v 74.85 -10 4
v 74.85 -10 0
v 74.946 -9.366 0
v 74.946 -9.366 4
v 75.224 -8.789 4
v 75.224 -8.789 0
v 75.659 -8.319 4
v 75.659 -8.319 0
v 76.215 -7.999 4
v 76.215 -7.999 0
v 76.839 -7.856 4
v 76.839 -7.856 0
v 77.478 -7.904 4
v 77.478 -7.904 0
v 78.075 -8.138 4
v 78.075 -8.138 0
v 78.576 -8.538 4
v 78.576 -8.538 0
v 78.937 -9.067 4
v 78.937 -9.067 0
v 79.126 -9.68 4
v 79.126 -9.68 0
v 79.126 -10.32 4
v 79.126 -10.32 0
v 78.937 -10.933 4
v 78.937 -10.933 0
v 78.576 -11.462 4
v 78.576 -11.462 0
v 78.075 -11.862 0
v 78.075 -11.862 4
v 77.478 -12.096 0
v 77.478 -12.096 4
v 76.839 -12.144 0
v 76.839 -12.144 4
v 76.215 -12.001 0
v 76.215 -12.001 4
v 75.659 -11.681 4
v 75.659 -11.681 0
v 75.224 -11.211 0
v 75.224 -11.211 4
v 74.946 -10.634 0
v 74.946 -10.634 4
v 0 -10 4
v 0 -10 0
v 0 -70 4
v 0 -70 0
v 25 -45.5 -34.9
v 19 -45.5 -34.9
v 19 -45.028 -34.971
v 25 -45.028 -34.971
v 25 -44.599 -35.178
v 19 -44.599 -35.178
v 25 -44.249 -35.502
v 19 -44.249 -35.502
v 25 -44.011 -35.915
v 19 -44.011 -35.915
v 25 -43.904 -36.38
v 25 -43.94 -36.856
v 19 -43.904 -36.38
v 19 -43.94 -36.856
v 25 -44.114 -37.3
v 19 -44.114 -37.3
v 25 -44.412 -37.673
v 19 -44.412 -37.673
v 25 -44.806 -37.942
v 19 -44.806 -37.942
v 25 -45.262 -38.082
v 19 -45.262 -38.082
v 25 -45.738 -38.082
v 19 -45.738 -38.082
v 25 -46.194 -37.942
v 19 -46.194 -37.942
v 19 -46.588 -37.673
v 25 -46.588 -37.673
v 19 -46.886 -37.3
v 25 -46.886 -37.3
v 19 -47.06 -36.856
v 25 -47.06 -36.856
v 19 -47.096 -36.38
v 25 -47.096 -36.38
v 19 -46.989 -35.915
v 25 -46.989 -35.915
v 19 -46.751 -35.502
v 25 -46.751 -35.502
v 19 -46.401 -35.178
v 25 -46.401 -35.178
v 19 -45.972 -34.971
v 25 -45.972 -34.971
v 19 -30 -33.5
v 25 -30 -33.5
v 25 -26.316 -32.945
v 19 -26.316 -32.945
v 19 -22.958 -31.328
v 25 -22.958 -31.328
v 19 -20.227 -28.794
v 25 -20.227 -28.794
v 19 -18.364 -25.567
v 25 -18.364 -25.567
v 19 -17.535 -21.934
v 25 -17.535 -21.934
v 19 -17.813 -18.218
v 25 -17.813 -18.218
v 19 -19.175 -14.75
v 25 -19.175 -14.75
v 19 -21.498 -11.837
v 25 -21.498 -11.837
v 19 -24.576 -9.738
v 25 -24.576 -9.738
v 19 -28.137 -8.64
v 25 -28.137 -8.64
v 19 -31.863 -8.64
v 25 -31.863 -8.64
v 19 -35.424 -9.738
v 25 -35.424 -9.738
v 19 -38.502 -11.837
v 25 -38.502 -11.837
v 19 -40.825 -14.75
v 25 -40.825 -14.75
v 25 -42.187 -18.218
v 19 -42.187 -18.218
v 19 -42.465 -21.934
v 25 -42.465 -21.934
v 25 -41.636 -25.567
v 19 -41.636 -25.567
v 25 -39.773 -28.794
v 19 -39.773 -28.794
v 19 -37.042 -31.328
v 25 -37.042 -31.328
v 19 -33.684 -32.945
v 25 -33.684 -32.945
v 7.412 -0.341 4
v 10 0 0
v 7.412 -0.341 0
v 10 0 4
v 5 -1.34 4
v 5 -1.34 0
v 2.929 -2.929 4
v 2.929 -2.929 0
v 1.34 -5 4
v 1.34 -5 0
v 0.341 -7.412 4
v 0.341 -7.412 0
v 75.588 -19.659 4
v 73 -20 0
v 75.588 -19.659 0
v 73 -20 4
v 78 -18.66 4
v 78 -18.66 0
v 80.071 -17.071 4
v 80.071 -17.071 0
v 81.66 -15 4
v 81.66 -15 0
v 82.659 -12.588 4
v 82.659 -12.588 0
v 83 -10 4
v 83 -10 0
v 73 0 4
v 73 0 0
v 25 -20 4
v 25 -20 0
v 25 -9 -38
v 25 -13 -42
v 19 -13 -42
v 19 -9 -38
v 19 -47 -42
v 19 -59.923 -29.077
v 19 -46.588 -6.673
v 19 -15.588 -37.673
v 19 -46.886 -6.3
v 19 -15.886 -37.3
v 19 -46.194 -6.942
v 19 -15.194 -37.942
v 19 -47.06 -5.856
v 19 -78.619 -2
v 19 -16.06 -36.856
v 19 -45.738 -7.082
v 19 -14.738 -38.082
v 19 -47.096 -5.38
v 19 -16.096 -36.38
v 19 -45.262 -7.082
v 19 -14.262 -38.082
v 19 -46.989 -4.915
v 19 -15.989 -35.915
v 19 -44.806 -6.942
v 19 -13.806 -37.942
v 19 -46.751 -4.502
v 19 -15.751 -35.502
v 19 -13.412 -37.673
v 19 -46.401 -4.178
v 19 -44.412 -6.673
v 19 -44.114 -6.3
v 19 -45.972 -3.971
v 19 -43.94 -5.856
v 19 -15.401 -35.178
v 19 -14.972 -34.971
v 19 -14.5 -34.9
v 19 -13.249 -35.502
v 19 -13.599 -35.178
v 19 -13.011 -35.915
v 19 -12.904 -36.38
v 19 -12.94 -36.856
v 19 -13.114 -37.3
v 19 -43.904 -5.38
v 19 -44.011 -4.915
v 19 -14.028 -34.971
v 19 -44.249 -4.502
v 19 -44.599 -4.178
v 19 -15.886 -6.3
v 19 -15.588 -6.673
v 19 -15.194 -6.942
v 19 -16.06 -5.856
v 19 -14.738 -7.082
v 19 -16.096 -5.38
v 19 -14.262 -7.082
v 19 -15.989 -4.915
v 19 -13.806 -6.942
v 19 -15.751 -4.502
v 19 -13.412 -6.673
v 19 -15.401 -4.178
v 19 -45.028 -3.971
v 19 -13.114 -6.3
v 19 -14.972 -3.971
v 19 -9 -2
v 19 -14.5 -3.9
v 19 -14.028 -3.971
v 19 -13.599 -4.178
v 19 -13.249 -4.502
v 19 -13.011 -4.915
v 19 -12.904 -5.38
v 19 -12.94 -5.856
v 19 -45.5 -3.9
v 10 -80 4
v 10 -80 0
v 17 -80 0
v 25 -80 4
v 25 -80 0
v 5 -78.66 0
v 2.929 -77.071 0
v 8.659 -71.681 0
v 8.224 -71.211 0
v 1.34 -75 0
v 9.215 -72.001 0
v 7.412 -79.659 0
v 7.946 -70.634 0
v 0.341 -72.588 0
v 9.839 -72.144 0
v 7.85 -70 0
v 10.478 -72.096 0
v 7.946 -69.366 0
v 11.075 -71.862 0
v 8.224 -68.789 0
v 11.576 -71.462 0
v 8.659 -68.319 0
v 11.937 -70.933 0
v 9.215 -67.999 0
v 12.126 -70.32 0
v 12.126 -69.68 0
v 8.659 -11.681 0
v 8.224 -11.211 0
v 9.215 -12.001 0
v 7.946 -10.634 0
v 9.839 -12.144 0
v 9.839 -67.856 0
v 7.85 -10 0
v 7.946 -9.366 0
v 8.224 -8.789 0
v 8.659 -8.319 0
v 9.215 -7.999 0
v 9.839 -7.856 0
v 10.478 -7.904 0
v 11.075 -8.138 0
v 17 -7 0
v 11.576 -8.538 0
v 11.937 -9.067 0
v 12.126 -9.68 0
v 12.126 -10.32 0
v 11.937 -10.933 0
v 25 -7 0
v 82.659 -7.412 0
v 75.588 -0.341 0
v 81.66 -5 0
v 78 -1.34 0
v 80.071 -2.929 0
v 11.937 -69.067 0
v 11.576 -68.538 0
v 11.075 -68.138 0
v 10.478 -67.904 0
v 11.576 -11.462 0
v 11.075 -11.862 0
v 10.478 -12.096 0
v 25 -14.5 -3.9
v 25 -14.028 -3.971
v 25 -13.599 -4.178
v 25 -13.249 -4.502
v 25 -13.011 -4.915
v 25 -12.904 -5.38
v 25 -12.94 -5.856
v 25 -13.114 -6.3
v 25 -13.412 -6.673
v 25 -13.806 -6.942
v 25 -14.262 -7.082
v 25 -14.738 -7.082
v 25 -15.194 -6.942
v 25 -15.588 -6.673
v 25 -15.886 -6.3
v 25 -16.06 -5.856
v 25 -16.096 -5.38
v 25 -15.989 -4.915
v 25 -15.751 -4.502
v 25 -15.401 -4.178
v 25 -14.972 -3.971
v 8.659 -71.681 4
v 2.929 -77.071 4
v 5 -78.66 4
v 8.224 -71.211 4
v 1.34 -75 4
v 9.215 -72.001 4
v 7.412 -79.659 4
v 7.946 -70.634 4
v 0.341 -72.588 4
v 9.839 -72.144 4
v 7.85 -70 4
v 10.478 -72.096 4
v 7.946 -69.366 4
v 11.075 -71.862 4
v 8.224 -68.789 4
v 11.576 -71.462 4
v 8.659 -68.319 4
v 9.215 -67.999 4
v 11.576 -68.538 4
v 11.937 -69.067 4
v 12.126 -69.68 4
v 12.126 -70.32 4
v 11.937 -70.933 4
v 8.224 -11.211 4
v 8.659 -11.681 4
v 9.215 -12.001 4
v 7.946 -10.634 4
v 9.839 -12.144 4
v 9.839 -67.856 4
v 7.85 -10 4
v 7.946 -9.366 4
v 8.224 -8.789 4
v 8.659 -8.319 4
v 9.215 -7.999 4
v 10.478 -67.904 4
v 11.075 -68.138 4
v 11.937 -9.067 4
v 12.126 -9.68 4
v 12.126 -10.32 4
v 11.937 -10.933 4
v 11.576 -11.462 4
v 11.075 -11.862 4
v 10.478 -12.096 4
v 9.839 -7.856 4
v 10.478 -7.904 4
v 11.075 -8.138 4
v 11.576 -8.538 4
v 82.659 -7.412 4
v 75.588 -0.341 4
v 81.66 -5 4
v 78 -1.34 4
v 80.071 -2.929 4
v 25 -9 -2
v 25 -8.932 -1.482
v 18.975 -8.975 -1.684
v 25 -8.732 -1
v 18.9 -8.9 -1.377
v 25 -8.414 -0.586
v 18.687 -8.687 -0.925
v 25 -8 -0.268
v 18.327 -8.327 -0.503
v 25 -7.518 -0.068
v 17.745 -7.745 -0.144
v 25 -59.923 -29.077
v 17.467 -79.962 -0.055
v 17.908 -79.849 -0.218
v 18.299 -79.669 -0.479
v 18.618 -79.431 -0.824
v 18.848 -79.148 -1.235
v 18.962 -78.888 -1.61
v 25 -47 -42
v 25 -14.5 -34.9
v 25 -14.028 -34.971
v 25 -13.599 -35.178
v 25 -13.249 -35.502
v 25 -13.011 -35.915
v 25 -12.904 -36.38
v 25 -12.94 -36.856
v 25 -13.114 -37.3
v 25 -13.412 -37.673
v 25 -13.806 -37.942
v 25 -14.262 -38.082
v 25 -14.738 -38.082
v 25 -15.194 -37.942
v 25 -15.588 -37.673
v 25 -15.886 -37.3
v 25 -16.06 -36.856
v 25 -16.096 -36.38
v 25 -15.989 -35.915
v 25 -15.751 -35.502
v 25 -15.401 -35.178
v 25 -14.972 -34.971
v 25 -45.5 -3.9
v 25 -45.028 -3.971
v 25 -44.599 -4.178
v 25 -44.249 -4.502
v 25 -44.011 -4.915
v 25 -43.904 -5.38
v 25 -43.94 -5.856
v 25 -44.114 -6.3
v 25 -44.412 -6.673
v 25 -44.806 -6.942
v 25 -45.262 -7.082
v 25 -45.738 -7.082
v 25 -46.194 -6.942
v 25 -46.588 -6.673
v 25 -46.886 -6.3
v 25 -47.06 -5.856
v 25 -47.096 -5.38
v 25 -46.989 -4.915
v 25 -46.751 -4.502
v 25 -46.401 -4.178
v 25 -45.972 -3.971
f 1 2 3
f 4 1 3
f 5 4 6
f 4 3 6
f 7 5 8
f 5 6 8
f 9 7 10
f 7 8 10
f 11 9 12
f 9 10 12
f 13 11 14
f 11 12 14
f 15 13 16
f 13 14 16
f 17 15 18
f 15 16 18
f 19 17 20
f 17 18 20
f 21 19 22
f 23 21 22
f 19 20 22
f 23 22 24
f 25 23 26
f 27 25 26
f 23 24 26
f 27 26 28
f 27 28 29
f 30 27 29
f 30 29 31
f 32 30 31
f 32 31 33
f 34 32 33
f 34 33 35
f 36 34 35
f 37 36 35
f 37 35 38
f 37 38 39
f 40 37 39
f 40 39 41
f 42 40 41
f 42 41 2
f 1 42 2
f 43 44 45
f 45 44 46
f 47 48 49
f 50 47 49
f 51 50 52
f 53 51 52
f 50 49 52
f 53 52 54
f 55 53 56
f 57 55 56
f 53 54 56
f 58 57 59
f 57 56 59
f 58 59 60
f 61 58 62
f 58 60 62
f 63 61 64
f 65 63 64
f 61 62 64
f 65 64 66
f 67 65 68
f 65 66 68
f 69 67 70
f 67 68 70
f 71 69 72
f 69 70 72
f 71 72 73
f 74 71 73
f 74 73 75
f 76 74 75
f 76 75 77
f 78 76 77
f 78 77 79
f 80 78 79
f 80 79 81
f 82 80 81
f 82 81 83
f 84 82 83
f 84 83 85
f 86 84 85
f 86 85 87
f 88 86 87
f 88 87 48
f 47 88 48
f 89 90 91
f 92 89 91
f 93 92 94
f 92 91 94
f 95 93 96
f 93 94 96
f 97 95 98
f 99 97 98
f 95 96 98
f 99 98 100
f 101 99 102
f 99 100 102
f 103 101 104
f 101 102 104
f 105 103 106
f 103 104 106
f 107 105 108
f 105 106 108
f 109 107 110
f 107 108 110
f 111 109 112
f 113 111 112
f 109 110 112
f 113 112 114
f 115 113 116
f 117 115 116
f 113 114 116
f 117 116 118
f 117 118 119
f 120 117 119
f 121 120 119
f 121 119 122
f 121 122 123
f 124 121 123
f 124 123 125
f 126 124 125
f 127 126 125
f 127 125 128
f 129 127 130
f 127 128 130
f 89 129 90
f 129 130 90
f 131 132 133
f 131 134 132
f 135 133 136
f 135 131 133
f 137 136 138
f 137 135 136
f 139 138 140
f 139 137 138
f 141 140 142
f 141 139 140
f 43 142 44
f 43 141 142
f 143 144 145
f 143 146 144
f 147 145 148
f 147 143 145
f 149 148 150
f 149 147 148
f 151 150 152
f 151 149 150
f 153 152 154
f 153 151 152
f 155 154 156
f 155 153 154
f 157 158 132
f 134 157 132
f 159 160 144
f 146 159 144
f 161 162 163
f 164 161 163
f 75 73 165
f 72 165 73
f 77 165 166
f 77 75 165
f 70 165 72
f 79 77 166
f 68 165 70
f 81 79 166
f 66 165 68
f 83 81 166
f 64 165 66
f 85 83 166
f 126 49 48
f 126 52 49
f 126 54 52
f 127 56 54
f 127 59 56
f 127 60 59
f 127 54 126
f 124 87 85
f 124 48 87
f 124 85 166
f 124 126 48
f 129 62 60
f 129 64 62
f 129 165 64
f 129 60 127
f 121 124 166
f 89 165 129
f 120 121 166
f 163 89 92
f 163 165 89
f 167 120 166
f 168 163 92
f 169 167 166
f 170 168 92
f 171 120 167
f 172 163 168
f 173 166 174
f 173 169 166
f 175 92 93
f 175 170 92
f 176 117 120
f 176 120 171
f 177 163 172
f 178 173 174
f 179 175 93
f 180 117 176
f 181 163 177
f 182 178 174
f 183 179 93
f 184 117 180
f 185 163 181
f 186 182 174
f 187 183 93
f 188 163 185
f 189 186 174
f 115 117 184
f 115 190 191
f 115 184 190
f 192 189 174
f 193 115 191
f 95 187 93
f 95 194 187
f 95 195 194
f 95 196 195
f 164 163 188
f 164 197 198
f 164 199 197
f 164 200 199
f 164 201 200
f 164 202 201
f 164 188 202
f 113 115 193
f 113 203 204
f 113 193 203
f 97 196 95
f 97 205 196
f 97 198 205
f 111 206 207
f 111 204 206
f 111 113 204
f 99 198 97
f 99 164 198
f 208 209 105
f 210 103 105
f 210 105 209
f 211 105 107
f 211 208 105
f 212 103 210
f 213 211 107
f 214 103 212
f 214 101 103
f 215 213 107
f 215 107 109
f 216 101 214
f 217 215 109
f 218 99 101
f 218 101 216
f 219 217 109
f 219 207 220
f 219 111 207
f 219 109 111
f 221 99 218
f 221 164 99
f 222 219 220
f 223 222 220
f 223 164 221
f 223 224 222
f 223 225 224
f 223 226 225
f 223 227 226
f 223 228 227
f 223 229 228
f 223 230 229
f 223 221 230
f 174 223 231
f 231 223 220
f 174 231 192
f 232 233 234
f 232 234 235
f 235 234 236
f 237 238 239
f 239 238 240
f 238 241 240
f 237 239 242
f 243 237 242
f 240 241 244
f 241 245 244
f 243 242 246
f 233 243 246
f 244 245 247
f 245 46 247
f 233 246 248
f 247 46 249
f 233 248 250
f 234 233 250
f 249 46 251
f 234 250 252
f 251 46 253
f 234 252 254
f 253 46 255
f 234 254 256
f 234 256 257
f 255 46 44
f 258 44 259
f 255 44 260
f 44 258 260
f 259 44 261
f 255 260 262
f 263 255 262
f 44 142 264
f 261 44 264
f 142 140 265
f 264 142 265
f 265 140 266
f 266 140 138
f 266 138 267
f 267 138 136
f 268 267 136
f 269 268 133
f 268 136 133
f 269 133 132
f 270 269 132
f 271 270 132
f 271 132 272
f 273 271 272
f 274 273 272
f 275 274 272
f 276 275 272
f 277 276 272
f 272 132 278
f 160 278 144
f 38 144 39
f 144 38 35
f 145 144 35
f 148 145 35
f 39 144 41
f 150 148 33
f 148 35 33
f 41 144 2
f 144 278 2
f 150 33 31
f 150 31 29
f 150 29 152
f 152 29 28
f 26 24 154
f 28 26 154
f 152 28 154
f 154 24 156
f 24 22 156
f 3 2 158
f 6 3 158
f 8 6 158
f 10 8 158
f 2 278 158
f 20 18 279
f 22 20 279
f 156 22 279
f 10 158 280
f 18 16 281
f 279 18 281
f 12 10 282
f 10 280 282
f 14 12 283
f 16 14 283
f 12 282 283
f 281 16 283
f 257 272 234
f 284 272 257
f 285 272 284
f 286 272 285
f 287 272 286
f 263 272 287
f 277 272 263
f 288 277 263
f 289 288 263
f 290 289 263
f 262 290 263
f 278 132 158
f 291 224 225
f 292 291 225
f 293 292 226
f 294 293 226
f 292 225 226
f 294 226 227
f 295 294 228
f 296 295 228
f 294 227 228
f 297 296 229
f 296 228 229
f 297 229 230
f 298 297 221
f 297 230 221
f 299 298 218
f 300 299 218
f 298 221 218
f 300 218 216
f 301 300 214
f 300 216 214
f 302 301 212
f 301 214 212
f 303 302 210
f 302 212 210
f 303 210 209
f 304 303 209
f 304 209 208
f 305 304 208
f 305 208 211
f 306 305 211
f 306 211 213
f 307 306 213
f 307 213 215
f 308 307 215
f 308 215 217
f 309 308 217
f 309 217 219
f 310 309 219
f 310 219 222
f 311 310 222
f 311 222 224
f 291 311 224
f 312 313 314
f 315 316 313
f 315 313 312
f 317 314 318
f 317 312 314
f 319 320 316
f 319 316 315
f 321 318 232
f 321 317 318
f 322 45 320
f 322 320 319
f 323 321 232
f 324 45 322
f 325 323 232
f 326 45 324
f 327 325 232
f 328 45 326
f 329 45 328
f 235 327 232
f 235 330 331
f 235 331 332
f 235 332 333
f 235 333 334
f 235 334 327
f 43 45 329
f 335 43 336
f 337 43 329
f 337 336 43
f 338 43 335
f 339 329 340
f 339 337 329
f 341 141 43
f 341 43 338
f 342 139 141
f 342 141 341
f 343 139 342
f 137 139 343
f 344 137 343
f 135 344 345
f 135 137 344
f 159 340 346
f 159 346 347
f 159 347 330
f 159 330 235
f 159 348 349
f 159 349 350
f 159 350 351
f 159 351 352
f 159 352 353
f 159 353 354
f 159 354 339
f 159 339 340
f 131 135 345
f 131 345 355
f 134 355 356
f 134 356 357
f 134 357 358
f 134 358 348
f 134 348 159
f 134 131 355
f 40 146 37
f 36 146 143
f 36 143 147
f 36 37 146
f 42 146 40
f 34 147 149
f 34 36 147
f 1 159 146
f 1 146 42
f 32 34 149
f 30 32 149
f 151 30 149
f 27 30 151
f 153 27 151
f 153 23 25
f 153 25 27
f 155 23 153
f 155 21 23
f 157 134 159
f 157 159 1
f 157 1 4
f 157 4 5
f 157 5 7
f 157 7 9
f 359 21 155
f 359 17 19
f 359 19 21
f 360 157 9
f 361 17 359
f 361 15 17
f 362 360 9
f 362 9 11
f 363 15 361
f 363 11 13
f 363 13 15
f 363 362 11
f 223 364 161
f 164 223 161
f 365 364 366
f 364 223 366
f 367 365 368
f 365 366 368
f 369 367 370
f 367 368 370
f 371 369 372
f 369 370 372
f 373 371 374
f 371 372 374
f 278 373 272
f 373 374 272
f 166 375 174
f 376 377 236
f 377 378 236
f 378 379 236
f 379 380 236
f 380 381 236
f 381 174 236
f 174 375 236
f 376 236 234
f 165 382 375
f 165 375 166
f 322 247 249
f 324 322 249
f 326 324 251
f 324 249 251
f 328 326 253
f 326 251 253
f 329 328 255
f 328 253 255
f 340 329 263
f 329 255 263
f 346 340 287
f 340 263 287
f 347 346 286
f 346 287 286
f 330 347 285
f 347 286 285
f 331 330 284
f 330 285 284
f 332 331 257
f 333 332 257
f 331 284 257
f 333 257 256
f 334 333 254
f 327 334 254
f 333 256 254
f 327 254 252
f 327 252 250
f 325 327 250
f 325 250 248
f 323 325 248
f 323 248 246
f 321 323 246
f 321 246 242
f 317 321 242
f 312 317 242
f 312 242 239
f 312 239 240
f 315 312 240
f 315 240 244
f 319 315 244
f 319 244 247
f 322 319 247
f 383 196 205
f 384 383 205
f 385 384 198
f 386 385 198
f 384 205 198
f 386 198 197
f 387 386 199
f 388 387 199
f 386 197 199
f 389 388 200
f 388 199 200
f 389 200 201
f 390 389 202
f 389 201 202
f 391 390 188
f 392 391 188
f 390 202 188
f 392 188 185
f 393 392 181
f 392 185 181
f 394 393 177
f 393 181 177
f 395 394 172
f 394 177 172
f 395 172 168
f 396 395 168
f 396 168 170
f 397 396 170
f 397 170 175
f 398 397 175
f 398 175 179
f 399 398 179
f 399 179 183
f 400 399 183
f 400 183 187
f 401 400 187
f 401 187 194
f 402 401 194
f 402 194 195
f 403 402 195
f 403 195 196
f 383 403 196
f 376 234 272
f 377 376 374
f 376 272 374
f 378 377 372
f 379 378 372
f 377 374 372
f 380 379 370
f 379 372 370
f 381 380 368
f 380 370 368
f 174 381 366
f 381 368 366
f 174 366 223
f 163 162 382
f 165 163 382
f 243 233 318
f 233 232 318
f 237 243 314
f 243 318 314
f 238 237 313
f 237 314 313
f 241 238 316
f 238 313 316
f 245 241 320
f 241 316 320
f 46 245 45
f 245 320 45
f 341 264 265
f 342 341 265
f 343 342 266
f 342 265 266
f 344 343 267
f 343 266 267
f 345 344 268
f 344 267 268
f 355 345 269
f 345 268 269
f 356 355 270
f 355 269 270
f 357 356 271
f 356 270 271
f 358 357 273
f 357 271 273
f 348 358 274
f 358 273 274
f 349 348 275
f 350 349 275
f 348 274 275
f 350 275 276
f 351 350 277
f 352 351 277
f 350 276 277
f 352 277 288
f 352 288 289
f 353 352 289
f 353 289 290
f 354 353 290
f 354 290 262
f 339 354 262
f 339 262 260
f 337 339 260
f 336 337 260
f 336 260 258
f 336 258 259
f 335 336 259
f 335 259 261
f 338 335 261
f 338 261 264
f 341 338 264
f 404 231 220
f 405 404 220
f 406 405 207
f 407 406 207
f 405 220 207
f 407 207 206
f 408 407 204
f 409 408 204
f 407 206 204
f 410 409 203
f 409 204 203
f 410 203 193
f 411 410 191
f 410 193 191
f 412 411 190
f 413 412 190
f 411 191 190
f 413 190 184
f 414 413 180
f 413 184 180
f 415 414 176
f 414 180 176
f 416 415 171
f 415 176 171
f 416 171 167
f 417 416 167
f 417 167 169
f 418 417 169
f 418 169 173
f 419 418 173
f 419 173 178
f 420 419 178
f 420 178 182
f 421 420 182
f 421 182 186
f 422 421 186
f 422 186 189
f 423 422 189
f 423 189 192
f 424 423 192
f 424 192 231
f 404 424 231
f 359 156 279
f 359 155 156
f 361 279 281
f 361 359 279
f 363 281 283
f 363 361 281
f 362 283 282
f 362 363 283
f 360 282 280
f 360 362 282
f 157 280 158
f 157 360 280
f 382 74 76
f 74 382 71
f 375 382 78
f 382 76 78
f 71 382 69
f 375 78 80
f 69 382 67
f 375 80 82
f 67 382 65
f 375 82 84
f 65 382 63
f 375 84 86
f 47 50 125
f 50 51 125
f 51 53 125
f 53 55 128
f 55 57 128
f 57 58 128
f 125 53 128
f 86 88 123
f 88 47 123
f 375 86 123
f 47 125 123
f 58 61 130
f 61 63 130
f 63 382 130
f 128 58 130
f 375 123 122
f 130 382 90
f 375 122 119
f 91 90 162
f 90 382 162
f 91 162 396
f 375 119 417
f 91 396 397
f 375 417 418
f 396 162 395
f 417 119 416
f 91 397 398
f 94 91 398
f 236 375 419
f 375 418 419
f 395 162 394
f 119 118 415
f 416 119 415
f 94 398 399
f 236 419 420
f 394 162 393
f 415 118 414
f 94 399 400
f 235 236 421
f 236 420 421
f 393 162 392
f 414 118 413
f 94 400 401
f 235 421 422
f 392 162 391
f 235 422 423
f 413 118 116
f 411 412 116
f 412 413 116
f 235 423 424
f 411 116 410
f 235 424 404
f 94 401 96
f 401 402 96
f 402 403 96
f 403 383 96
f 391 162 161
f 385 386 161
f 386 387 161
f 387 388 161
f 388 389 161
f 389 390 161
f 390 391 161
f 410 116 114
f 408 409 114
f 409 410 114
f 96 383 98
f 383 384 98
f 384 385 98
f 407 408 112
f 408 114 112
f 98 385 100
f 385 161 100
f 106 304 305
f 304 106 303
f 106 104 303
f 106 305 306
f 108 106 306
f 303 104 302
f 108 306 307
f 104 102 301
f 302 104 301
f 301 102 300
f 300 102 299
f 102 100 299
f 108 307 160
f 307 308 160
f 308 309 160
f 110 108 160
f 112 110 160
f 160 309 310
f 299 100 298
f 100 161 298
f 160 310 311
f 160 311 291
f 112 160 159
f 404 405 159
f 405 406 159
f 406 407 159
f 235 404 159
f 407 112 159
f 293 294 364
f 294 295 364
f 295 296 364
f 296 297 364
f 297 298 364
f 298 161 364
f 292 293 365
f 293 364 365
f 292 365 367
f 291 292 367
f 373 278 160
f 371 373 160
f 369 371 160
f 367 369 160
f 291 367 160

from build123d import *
from OCP.BRepFilletAPI import BRepFilletAPI_MakeChamfer

# Parameters (mm, degrees)
BOSS_EXTRU_1_DEPTH   = 4
ESQUISSE3_R          = 12.5
BOSS_EXTRU_2_DEPTH   = 6
D_GAGEMENT_M31_D     = 3.2
D_GAGEMENT_M41_D     = 4.3
D_GAGEMENT_M41_DEPTH = 15
CONG_1_R             = 2
CHANFREIN1_SIZE      = 4
CHANFREIN1_SIZE2     = 15.704369422
CONG_2_R             = 10


with BuildPart() as part:
    # Esquisse1 → Boss.-Extru.1 (new body)
    with BuildSketch(Plane.XY):
        Polygon((0, 0), (0, -80), (25, -80), (25, -20), (83, -20), (83, 0), align=None)
    extrude(amount=BOSS_EXTRU_1_DEPTH)

    # Esquisse3 → Boss.-Extru.2 (add)
    with BuildSketch(Plane(origin=(25, 0, 0), x_dir=(0, 0, -1), z_dir=(1, 0, 0))):
        Polygon((0, -9), (42, -9), (42, -51), (0, -80), align=None)
        with Locations((21, -30)):
            Circle(ESQUISSE3_R, mode=Mode.SUBTRACT)
    extrude(amount=-BOSS_EXTRU_2_DEPTH)

    # Dégagement M31 (through all)
    with Locations(Plane(origin=(25, 0, 0), x_dir=(0, 0, -1), z_dir=(1, 0, 0))):
        with Locations((5.5, -14.5), (36.5, -14.5), (36.5, -45.5), (5.5, -45.5)):
            Hole(D_GAGEMENT_M31_D / 2)

    # Dégagement M41
    with Locations(Plane.XY.offset(4)):
        with Locations((10, -10), (10, -70), (77, -10)):
            Hole(D_GAGEMENT_M41_D / 2, depth=D_GAGEMENT_M41_DEPTH)

    # Congé1
    cong_1_edges = [part.edges().sort_by_distance(p)[0] for p in [
        (19, -44.5, 0),
        (22, -9, 0),
    ]]
    fillet(cong_1_edges, radius=CONG_1_R)

    # Chanfrein1: one chamfer whose edges measure the first distance from different faces: ONE call of the kernel's chamfer builder (chamfer() names one face for all edges)
    chanfrein1_edges_1 = [part.edges().sort_by_distance(p)[0] for p in [
        (22, -9, -42),
    ]]
    chanfrein1_edges_2 = [part.edges().sort_by_distance(p)[0] for p in [
        (22, -51, -42),
    ]]
    chanfrein1_side_2 = [part.faces().sort_by_distance(p)[0] for p in [
        (22, -30, -42),
    ]]
    chanfrein1 = BRepFilletAPI_MakeChamfer(part.part.solid().wrapped)
    for e in chanfrein1_edges_1:
        chanfrein1.Add(CHANFREIN1_SIZE, e.wrapped)
    for e in chanfrein1_edges_2:
        chanfrein1.Add(CHANFREIN1_SIZE, CHANFREIN1_SIZE2, e.wrapped, chanfrein1_side_2[0].wrapped)  # the first distance lies on this face
    add(Compound.cast(chanfrein1.Shape()), mode=Mode.REPLACE)

    # Congé2
    cong_2_edges = [part.edges().sort_by_distance(p)[0] for p in [
        (83, -20, 2),
        (0, -80, 2),
        (0, 0, 2),
        (83, 0, 2),
    ]]
    fillet(cong_2_edges, radius=CONG_2_R - 0.0001)  # a hair under: the kernel refuses the full size


solid = part.part
